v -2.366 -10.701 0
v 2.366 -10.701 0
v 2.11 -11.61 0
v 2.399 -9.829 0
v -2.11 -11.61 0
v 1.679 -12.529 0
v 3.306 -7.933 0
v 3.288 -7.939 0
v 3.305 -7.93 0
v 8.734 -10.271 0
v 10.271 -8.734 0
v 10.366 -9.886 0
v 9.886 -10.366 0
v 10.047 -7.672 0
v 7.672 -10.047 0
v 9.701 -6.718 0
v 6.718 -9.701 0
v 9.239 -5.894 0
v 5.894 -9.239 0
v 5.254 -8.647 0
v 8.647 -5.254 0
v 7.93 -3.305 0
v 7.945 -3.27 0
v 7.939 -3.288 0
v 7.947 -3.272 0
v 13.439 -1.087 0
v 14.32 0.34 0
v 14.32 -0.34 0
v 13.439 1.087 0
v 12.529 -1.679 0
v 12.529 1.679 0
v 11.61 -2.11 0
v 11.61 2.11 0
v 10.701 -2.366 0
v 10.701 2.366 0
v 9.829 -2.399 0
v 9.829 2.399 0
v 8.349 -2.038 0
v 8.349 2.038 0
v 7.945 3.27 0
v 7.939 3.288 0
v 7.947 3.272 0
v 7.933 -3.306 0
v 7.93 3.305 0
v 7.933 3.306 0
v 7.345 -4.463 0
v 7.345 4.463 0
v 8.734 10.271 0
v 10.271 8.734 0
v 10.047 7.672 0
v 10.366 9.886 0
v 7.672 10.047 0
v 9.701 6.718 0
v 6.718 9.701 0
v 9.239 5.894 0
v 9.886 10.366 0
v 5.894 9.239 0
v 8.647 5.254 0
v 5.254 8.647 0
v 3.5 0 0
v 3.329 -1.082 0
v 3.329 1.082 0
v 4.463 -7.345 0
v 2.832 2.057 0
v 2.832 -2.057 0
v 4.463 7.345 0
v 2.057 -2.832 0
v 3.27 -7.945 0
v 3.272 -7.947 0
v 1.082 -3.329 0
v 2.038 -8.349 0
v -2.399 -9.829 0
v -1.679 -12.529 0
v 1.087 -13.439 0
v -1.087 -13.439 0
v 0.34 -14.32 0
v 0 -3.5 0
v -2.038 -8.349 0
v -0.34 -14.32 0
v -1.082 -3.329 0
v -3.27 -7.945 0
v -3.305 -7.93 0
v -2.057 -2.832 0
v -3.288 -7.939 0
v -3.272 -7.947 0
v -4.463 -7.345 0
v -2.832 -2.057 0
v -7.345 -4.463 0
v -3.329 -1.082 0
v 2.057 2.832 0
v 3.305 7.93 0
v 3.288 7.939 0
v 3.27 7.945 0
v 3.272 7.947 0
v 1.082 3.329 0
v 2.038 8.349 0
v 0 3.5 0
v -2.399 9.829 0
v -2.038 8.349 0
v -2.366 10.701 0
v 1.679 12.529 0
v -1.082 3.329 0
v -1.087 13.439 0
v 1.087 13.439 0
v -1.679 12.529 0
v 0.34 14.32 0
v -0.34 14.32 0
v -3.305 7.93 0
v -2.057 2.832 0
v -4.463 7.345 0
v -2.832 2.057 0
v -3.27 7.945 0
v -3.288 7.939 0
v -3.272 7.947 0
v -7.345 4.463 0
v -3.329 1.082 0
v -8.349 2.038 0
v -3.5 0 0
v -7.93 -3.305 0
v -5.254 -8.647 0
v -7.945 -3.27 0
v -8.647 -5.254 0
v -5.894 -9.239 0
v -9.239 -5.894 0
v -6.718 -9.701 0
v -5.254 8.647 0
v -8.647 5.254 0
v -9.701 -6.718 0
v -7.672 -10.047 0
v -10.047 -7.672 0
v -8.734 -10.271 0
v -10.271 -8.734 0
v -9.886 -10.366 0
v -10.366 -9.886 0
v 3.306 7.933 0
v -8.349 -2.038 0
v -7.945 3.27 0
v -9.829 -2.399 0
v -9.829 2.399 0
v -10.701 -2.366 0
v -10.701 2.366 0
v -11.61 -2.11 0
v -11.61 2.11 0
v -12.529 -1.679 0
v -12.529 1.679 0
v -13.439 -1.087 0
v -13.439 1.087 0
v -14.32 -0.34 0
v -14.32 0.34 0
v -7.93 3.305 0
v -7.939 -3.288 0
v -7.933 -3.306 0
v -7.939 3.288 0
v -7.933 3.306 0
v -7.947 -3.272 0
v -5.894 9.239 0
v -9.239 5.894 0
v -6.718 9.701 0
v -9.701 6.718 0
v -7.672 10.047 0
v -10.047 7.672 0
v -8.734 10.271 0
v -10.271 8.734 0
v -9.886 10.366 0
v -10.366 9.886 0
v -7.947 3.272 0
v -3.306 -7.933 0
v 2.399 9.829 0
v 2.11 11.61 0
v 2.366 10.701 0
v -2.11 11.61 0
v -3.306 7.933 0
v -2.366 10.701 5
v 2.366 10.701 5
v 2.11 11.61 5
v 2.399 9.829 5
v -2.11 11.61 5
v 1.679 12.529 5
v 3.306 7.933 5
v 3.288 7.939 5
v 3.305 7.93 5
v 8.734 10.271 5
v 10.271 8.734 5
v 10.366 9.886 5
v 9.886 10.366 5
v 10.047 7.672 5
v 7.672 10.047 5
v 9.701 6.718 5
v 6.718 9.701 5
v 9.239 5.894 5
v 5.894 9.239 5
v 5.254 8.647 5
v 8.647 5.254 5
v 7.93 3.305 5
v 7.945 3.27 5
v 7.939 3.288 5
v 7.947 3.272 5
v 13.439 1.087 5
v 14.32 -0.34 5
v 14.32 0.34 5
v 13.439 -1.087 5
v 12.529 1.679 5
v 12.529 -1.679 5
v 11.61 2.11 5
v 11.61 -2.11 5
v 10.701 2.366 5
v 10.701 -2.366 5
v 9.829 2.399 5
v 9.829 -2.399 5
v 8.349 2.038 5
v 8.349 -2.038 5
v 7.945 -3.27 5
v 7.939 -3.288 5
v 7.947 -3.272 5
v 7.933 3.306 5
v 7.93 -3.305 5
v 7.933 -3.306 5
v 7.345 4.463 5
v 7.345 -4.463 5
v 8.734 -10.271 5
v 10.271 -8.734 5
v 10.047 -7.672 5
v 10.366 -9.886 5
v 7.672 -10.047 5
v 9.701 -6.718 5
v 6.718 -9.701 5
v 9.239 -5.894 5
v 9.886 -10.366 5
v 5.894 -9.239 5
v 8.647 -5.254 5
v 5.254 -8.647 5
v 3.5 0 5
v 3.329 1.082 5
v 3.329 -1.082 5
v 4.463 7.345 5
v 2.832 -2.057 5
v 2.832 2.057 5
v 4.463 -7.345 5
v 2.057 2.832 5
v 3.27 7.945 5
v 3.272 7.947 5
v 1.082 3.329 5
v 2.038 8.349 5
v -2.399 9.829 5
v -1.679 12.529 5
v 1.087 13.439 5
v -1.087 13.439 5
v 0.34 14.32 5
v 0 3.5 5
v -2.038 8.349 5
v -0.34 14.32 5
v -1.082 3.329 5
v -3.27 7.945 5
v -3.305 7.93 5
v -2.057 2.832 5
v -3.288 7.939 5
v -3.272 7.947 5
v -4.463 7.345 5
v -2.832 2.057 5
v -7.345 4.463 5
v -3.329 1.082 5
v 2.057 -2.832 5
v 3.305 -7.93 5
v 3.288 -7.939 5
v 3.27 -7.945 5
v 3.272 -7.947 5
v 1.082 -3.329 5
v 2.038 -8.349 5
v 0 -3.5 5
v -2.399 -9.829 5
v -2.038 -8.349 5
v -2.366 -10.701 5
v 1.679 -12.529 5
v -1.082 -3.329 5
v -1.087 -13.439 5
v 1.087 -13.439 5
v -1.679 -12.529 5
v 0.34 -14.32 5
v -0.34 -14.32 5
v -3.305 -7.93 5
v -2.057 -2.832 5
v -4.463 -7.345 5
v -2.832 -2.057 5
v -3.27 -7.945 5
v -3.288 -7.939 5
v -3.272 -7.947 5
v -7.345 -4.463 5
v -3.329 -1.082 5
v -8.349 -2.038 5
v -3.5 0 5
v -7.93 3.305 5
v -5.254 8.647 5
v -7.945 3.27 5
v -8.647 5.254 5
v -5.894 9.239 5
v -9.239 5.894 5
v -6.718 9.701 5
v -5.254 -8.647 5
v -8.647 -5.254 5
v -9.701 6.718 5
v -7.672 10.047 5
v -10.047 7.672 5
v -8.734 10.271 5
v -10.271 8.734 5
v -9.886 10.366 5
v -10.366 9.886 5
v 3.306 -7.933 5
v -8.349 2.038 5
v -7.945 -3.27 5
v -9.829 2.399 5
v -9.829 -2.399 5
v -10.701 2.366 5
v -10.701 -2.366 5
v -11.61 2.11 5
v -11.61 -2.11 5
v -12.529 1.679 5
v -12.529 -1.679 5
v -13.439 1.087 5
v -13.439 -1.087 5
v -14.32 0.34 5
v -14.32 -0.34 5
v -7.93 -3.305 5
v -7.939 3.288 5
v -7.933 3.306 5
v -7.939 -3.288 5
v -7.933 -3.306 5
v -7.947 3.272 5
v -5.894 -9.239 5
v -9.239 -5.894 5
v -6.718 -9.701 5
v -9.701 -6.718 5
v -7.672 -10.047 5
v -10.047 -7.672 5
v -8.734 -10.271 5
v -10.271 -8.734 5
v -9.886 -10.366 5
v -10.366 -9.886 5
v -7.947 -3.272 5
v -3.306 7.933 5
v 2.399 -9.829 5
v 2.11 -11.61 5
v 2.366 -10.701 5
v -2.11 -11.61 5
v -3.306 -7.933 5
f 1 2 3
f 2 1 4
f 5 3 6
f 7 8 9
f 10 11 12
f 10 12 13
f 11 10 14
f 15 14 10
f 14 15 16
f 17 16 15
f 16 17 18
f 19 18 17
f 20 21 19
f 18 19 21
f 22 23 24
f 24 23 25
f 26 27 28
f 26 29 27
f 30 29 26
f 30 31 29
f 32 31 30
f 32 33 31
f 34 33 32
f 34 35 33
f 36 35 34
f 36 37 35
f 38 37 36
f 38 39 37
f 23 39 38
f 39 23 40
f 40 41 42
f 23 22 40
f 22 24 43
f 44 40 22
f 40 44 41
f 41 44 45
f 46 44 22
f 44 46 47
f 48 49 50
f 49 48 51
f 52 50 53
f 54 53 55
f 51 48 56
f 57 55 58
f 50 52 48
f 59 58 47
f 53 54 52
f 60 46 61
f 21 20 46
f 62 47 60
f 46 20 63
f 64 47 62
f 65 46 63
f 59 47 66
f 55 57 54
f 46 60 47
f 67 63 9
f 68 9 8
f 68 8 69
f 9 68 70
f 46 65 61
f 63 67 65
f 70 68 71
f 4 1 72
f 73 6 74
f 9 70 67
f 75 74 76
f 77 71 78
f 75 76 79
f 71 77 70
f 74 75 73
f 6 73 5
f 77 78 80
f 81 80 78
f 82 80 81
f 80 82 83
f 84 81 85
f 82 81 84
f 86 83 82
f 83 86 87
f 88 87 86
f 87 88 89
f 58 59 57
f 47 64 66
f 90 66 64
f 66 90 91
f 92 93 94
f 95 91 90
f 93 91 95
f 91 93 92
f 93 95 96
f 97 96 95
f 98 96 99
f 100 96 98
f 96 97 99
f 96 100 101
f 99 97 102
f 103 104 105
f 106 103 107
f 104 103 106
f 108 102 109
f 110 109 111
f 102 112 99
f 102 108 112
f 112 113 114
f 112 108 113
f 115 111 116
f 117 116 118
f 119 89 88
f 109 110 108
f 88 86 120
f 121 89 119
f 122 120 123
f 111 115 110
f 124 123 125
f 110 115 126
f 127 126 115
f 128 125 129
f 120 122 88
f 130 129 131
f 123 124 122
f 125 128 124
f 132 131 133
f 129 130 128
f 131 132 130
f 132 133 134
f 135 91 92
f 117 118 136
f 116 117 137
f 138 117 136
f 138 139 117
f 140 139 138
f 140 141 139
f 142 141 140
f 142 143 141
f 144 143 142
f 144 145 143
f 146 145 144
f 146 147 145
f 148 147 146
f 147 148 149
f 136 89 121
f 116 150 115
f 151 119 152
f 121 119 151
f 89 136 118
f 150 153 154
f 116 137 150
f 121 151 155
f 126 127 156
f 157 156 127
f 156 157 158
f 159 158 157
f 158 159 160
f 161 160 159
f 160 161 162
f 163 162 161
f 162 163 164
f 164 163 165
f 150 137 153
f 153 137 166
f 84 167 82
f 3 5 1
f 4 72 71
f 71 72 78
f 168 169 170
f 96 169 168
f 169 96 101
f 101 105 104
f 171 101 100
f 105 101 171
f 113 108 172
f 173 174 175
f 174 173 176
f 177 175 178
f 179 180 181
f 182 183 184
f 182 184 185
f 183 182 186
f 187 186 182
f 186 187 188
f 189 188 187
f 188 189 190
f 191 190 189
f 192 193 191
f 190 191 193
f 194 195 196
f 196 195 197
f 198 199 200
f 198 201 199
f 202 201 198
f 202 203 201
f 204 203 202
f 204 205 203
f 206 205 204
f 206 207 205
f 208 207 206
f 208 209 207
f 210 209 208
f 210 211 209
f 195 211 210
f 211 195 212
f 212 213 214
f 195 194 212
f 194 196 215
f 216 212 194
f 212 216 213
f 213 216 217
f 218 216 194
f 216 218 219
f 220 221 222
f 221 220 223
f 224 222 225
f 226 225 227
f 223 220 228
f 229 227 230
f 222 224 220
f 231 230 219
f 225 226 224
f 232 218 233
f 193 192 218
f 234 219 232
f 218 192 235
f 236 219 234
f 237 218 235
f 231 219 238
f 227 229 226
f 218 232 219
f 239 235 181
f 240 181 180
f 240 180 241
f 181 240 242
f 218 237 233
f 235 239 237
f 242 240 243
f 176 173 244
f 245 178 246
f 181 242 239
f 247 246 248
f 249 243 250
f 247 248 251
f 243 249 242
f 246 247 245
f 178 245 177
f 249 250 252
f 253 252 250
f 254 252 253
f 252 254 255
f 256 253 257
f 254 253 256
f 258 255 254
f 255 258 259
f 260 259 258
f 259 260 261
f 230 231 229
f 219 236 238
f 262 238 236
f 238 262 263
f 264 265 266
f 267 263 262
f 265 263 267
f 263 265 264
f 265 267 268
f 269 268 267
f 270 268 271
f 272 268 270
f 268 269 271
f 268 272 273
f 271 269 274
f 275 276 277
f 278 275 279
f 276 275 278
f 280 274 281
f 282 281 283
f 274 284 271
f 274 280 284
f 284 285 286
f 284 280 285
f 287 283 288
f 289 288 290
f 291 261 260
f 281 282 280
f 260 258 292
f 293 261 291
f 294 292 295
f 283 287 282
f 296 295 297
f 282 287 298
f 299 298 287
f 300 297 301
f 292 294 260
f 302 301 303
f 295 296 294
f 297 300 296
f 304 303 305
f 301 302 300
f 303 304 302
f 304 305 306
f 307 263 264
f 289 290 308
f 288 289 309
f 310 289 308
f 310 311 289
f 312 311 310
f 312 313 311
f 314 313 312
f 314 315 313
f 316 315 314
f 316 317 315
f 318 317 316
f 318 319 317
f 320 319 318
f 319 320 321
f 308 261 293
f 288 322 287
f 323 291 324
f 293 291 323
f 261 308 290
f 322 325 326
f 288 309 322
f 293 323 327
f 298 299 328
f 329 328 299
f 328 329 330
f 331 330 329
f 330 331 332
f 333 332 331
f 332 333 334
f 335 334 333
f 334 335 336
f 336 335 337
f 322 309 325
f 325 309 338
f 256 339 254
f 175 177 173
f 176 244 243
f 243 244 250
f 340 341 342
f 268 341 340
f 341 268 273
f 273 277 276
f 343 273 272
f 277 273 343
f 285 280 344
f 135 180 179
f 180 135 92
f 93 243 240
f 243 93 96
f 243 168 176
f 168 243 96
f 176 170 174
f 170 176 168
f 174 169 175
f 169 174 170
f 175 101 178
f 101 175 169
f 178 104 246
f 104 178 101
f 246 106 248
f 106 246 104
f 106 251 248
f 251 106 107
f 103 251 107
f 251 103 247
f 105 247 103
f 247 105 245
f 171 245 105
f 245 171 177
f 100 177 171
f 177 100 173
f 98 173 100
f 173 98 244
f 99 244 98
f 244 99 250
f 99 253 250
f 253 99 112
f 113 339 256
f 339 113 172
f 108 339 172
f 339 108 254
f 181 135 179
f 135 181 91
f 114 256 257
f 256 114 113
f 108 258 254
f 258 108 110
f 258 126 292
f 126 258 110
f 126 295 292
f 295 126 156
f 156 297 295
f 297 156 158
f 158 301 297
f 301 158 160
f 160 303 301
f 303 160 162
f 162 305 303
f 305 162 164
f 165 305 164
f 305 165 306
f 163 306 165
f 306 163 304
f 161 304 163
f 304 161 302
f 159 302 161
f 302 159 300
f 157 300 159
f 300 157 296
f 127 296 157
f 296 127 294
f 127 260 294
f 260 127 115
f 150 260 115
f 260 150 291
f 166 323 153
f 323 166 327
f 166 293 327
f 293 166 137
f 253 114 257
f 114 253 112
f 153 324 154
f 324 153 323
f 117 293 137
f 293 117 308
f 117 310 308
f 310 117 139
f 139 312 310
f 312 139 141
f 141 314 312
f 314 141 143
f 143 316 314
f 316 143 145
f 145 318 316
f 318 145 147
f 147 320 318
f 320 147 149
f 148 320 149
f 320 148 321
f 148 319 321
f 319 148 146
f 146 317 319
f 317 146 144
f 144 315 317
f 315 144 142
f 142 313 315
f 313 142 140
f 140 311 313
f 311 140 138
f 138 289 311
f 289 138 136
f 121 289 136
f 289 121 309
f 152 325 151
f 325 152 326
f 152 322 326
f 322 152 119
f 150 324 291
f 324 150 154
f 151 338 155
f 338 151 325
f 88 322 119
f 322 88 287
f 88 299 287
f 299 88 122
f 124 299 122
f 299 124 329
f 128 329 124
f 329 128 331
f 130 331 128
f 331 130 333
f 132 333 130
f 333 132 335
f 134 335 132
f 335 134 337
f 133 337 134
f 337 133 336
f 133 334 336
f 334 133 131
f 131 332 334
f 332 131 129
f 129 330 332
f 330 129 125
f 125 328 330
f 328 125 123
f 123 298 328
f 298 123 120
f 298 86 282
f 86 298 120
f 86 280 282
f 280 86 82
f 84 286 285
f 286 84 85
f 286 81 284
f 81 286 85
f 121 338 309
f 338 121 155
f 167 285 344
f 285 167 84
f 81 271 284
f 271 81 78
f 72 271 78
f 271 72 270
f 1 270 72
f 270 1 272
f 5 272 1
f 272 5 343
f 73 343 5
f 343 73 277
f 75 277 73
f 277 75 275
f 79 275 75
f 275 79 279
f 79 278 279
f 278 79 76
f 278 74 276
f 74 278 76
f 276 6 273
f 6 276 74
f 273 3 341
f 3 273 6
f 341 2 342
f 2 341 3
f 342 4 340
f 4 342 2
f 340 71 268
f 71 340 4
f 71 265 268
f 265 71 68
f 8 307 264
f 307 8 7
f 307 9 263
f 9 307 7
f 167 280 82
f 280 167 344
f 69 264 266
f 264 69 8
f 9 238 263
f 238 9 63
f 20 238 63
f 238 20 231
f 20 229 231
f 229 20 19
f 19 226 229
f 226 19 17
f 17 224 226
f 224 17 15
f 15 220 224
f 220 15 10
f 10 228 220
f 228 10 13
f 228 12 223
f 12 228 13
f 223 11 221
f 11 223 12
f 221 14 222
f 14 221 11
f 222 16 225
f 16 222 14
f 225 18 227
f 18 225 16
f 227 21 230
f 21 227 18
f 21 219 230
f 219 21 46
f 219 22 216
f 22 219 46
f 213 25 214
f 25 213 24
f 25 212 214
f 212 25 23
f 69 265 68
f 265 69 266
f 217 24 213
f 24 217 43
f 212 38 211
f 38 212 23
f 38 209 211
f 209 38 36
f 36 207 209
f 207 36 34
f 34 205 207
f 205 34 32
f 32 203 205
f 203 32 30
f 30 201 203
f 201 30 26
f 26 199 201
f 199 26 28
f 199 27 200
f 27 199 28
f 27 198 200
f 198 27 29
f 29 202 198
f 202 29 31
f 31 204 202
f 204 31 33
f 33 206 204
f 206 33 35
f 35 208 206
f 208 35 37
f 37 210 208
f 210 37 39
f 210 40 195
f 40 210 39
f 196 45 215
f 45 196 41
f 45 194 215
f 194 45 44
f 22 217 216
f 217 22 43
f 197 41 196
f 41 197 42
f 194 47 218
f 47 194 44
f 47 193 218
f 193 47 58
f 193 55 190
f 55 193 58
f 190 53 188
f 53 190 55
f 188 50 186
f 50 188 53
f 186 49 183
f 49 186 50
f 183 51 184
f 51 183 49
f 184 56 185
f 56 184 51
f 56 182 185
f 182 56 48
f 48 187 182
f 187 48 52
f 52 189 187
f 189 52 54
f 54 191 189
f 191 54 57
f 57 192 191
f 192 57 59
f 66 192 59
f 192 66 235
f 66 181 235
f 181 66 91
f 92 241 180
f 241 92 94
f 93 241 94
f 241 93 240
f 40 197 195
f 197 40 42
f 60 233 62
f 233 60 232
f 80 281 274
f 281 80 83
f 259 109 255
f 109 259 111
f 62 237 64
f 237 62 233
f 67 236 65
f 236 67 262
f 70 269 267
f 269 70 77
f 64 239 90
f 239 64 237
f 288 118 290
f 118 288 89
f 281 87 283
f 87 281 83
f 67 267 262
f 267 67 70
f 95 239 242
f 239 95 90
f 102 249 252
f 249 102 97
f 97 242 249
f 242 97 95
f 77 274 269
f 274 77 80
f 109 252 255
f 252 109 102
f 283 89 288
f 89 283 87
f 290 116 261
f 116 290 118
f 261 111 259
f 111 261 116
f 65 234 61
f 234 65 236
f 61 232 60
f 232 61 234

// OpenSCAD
// Source: https://github.com/sadr0b0t/pd-gears/blob/master/pd-gears.scad

//////////////////////////////////////////////////////////////////////////////////////////////
// Public Domain Parametric Involute Spur Gear (and involute helical gear and involute rack)
// version 1.1
// by Leemon Baird, 2011, Leemon@Leemon.com
//http://www.thingiverse.com/thing:5505
//
// This file is public domain.  Use it for any purpose, including commercial
// applications.  Attribution would be nice, but is not required.  There is
// no warranty of any kind, including its correctness, usefulness, or safety.
// 
// This is parameterized involute spur (or helical) gear.  It is much simpler and less powerful than
// others on Thingiverse.  But it is public domain.  I implemented it from scratch from the 
// descriptions and equations on Wikipedia and the web, using Mathematica for calculations and testing,
// and I now release it into the public domain.
//
//		http://en.wikipedia.org/wiki/Involute_gear
//		http://en.wikipedia.org/wiki/Gear
//		http://en.wikipedia.org/wiki/List_of_gear_nomenclature
//		http://gtrebaol.free.fr/doc/catia/spur_gear.html
//		http://www.cs.cmu.edu/~rapidproto/mechanisms/chpt7.html
//
// The module gear() gives an involute spur gear, with reasonable defaults for all the parameters.
// Normally, you should just choose the first 4 parameters, and let the rest be default values.
// The module gear() gives a gear in the XY plane, centered on the origin, with one tooth centered on
// the positive Y axis.  The various functions below it take the same parameters, and return various
// measurements for the gear.  The most important is pitch_radius, which tells how far apart to space
// gears that are meshing, and adendum_radius, which gives the size of the region filled by the gear.
// A gear has a "pitch circle", which is an invisible circle that cuts through the middle of each
// tooth (though not the exact center). In order for two gears to mesh, their pitch circles should 
// just touch.  So the distance between their centers should be pitch_radius() for one, plus pitch_radius() 
// for the other, which gives the radii of their pitch circles.
//
// In order for two gears to mesh, they must have the same mm_per_tooth and pressure_angle parameters.  
// mm_per_tooth gives the number of millimeters of arc around the pitch circle covered by one tooth and one
// space between teeth.  The pitch angle controls how flat or bulged the sides of the teeth are.  Common
// values include 14.5 degrees and 20 degrees, and occasionally 25.  Though I've seen 28 recommended for
// plastic gears. Larger numbers bulge out more, giving stronger teeth, so 28 degrees is the default here.
//
// The ratio of number_of_teeth for two meshing gears gives how many times one will make a full 
// revolution when the the other makes one full revolution.  If the two numbers are coprime (i.e. 
// are not both divisible by the same number greater than 1), then every tooth on one gear
// will meet every tooth on the other, for more even wear.  So coprime numbers of teeth are good.
//
// The module rack() gives a rack, which is a bar with teeth.  A rack can mesh with any
// gear that has the same mm_per_tooth and pressure_angle.
//
// Some terminology: 
// The outline of a gear is a smooth circle (the "pitch circle") which has mountains and valleys
// added so it is toothed.  So there is an inner circle (the "root circle") that touches the 
// base of all the teeth, an outer circle that touches the tips of all the teeth,
// and the invisible pitch circle in between them.  There is also a "base circle", which can be smaller than
// all three of the others, which controls the shape of the teeth.  The side of each tooth lies on the path 
// that the end of a string would follow if it were wrapped tightly around the base circle, then slowly unwound.  
// That shape is an "involute", which gives this type of gear its name.
//
//////////////////////////////////////////////////////////////////////////////////////////////

//An involute spur gear, with reasonable defaults for all the parameters.
//Normally, you should just choose the first 4 parameters, and let the rest be default values.
//Meshing gears must match in mm_per_tooth, pressure_angle, and twist,
//and be separated by the sum of their pitch radii, which can be found with pitch_radius().
module gear (
	mm_per_tooth    = 3,    //this is the "circular pitch", the circumference of the pitch circle divided by the number of teeth
	number_of_teeth = 11,   //total number of teeth around the entire perimeter
	thickness       = 6,    //thickness of gear in mm
	hole_diameter   = 3,    //diameter of the hole in the center, in mm
	twist           = 0,    //teeth rotate this many degrees from bottom of gear to top.  360 makes the gear a screw with each thread going around once
	teeth_to_hide   = 0,    //number of teeth to delete to make this only a fraction of a circle
	pressure_angle  = 28,   //Controls how straight or bulged the tooth sides are. In degrees.
	clearance       = 0.0,  //gap between top of a tooth on one gear and bottom of valley on a meshing gear (in millimeters)
	backlash        = 0.0,   //gap between two meshing teeth, in the direction along the circumference of the pitch circle
    center = false,   // center gear by z axis
    $fn = 20   // number of fragments to draw hole cylinder
) {
	p  = mm_per_tooth * number_of_teeth / PI / 2;  //radius of pitch circle
	c  = p + mm_per_tooth / PI - clearance;        //radius of outer circle
	b  = p*cos(pressure_angle);                    //radius of base circle
	r  = p-(c-p)-clearance;                        //radius of root circle
	t  = mm_per_tooth/2-backlash/2;                //tooth thickness at pitch circle
	k  = -iang(b, p) - t/2/p/PI*180;             //angle to where involute meets base circle on each side of tooth
    difference() {
        for (i = [0:(number_of_teeth-teeth_to_hide-1 > 0 ? 1 : -1):number_of_teeth-teeth_to_hide-1] )
            rotate([0,0,i*360/number_of_teeth])
                linear_extrude(height = thickness, center = center, convexity = 10, twist = twist)
                    polygon(
                        points=[
                            [0, -hole_diameter/10],
                            polar(r, -181/number_of_teeth),
                            polar(r, r<b ? k : -180/number_of_teeth),
                            q7(0/5,r,b,c,k, 1),q7(1/5,r,b,c,k, 1),q7(2/5,r,b,c,k, 1),q7(3/5,r,b,c,k, 1),q7(4/5,r,b,c,k, 1),q7(5/5,r,b,c,k, 1),
                            q7(5/5,r,b,c,k,-1),q7(4/5,r,b,c,k,-1),q7(3/5,r,b,c,k,-1),q7(2/5,r,b,c,k,-1),q7(1/5,r,b,c,k,-1),q7(0/5,r,b,c,k,-1),
                            polar(r, r<b ? -k : 180/number_of_teeth),
                            polar(r, 181/number_of_teeth)
                        ],
                        paths=[[0,1,2,3,4,5,6,7,8,9,10,11,12,13,14,15,16]]
                    );
        translate([0,0, (center ? 0 : -0.1)])
            cylinder(h=thickness+0.2, r=hole_diameter/2, center=center, $fn=$fn);
    }
};	
//these 4 functions are used by gear
function polar(r,theta)   = r*[sin(theta), cos(theta)];                            //convert polar to cartesian coordinates
function iang(r1,r2)      = sqrt((r2/r1)*(r2/r1) - 1)/PI*180 - acos(r1/r2); //unwind a string this many degrees to go from radius r1 to radius r2
function q7(f,r,b,r2,t,s) = q6(b,s,t,(1-f)*max(b,r)+f*r2);                         //radius a fraction f up the curved side of the tooth 
function q6(b,s,t,d)      = polar(d,s*(iang(b,d)+t));                              //point at radius d on the involute curve

//a rack, which is a straight line with teeth (the same as a segment from a giant gear with a huge number of teeth).
//The "pitch circle" is a line along the X axis.
module rack (
	mm_per_tooth    = 3,    //this is the "circular pitch", the circumference of the pitch circle divided by the number of teeth
	number_of_teeth = 11,   //total number of teeth along the rack
	thickness       = 6,    //thickness of rack in mm (affects each tooth)
	height          = 120,   //height of rack in mm, from tooth top to far side of rack.
	pressure_angle  = 28,   //Controls how straight or bulged the tooth sides are. In degrees.
	backlash        = 0.0,   //gap between two meshing teeth, in the direction along the circumference of the pitch circle
    center = false,   // center rack by z axis
) {
	a = mm_per_tooth / PI; //addendum
	t = a*cos(pressure_angle)-mm_per_tooth/10;         //tooth side is tilted so top/bottom corners move this amount
		for (i = [0:number_of_teeth-1] )
			translate([i*mm_per_tooth,0,0])
				linear_extrude(height = thickness, center = center, convexity = 10)
					polygon(
						points=[
							[-mm_per_tooth * 3/4,                 a-height],
							[-mm_per_tooth * 3/4 - backlash,     -a],
							[-mm_per_tooth * 1/4 + backlash - t, -a],
							[-mm_per_tooth * 1/4 + backlash + t,  a],
							[ mm_per_tooth * 1/4 - backlash - t,  a],
							[ mm_per_tooth * 1/4 - backlash + t, -a],
							[ mm_per_tooth * 3/4 + backlash,     -a],
							[ mm_per_tooth * 3/4,                 a-height],
						],
						paths=[[0,1,2,3,4,5,6,7]]
					);
};	

//These 5 functions let the user find the derived dimensions of the gear.
//A gear fits within a circle of radius outer_radius, and two gears should have
//their centers separated by the sum of their pictch_radius.
function circular_pitch  (mm_per_tooth=3) = mm_per_tooth;                     //tooth density expressed as "circular pitch" in millimeters
function diametral_pitch (mm_per_tooth=3) = PI / mm_per_tooth;         //tooth density expressed as "diametral pitch" in teeth per millimeter
function module_value    (mm_per_tooth=3) = mm_per_tooth / PI;                //tooth density expressed as "module" or "modulus" in millimeters
function pitch_radius    (mm_per_tooth=3,number_of_teeth=11) = mm_per_tooth * number_of_teeth / PI / 2;
function outer_radius    (mm_per_tooth=3,number_of_teeth=11,clearance=0.1)    //The gear fits entirely within a cylinder of this radius.
	= mm_per_tooth*(1+number_of_teeth/2)/PI  - clearance;              

//////////////////////////////////////////////////////////////////////////////////////////////
//example gear train.  
//Try it with OpenSCAD View/Animate command with 20 steps and 24 FPS.
//The gears will continue to be rotated to mesh correctly if you change the number of teeth.

n1 = 8; //red gear number of teeth
n2 = 7; //green gear
n3 = 5;  //blue gear
n4 = 20; //orange gear
n5 = 8;  //gray rack
mm_per_tooth = 9; //all meshing gears need the same mm_per_tooth (and the same pressure_angle)
thickness    = 5;
hole         = 7;
height       = 12;

d1 =pitch_radius(mm_per_tooth,n1);
d12=pitch_radius(mm_per_tooth,n1) + pitch_radius(mm_per_tooth,n2);
d13=pitch_radius(mm_per_tooth,n1) + pitch_radius(mm_per_tooth,n3);
d14=pitch_radius(mm_per_tooth,n1) + pitch_radius(mm_per_tooth,n4);

translate([ 0,    0, 0]) rotate([0,0, $t*360/n1])                 color([1.00,0.75,0.75]) gear(mm_per_tooth,n1,thickness,hole);
//translate([ 0,  d12, 0]) rotate([0,0,-($t+n2/2-0*n1+1/2)*360/n2]) color([0.75,1.00,0.75]) gear(mm_per_tooth,n2,thickness,hole,0,108);
//translate([ d13,  0, 0]) rotate([0,0,-($t-n3/4+n1/4+1/2)*360/n3]) color([0.75,0.75,1.00]) gear(mm_per_tooth,n3,thickness,hole);
//translate([ d13,  0, 0]) rotate([0,0,-($t-n3/4+n1/4+1/2)*360/n3]) color([0.75,0.75,1.00]) gear(mm_per_tooth,n3,thickness,hole);
//translate([-d14,  0, 0]) rotate([0,0,-($t-n4/4-n1/4+1/2-floor(n4/4)-3)*360/n4]) color([1.00,0.75,0.50]) gear(mm_per_tooth,n4,thickness,hole,0,n4-3);
//translate([(-floor(n5/2)-floor(n1/2)+$t+n1/2-1/2)*9, -d1+0.0, 0]) rotate([0,0,0]) color([0.75,0.75,0.75]) rack(mm_per_tooth,n5,thickness,height);
